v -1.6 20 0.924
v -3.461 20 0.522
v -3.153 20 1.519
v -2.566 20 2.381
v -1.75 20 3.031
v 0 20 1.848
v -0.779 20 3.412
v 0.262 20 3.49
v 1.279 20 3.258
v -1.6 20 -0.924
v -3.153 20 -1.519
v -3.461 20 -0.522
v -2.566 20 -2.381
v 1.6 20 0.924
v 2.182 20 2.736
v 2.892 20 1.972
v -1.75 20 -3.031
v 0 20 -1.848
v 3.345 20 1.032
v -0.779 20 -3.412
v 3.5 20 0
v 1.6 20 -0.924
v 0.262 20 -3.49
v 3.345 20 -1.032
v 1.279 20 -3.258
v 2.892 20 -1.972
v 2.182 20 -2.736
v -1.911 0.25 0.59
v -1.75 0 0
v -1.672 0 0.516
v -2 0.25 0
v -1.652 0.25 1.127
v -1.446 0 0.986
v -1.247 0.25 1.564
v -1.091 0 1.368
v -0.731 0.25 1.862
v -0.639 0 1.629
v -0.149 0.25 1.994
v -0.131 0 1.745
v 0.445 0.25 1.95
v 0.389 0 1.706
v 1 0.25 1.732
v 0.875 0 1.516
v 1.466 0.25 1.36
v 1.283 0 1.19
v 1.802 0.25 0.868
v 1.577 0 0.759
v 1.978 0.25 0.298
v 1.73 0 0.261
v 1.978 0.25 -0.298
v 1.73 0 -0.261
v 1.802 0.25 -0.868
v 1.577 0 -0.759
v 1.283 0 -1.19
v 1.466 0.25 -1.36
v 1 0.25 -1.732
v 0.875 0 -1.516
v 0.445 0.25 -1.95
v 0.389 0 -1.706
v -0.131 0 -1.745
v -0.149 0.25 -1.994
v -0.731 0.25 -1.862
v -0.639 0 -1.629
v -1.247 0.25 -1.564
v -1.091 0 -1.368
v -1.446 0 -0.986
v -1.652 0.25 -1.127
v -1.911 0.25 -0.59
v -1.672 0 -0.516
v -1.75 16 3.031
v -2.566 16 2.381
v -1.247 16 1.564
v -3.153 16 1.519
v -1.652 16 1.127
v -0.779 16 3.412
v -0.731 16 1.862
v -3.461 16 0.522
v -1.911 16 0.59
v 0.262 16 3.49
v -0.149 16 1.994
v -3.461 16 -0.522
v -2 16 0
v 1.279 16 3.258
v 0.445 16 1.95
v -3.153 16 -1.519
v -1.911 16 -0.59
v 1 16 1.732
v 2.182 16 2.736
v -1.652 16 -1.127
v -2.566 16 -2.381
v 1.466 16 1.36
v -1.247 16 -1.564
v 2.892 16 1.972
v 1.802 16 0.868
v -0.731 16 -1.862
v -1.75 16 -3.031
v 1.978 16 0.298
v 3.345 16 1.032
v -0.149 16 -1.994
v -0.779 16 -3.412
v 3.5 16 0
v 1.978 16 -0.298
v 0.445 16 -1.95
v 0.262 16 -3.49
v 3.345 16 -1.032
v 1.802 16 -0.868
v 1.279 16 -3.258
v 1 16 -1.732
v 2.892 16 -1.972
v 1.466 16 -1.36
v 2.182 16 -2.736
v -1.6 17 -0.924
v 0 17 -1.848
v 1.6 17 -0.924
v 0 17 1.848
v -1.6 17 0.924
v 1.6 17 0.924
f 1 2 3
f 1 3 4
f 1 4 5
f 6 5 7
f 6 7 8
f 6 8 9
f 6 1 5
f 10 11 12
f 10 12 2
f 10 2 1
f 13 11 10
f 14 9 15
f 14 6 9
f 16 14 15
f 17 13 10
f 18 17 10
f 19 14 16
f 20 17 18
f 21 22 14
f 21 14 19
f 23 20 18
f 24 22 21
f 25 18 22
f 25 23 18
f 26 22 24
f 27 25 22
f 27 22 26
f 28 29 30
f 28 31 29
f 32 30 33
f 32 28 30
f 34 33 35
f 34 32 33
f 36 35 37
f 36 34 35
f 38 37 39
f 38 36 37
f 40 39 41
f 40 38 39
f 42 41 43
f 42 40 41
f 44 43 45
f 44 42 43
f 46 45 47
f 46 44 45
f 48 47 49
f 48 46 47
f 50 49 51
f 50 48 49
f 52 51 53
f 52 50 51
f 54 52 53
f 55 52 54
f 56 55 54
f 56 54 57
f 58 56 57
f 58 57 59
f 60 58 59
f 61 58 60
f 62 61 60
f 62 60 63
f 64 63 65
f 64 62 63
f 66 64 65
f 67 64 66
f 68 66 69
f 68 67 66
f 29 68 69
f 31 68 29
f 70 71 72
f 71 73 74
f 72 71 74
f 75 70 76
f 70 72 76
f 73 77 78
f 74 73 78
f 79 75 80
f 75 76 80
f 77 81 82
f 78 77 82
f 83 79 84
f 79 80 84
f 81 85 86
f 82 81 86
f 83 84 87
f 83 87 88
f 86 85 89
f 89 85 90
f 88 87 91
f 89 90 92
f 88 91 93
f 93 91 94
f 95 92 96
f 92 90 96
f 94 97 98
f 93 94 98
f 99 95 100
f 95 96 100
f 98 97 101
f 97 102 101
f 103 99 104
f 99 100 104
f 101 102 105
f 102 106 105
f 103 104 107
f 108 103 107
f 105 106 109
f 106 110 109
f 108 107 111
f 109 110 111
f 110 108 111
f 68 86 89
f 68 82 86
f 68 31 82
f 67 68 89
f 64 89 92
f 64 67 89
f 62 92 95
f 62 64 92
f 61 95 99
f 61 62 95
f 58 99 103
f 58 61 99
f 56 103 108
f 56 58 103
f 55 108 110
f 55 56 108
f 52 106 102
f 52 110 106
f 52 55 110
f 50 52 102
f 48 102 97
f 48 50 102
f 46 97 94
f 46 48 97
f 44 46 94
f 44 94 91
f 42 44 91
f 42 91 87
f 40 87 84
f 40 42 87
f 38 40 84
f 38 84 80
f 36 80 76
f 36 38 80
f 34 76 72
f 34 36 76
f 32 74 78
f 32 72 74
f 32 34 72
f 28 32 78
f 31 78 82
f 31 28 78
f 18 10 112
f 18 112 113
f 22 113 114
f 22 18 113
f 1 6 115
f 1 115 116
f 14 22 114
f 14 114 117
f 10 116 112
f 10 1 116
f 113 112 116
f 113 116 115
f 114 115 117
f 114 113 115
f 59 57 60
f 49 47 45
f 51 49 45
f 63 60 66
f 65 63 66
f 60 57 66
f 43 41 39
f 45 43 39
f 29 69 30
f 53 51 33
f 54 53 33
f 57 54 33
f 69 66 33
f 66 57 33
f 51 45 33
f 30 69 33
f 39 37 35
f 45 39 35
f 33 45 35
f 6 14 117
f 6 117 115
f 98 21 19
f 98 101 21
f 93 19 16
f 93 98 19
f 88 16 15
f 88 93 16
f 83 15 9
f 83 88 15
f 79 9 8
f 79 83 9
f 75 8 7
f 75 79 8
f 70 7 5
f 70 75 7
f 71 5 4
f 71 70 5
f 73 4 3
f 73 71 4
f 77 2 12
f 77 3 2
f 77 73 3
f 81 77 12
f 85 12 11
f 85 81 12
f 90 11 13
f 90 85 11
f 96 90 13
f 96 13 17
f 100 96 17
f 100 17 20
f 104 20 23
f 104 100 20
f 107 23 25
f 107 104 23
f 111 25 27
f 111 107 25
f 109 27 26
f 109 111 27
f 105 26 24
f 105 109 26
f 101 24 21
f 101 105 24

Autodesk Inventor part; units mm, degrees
ref_plane "YZ Plane" through (0, 0, 0) normal (1, 0, 0) x (0, 1, 0)
ref_plane "XZ Plane" through (0, 0, 0) normal (0, 1, 0) x (-1, 0, 0)
ref_plane "XY Plane" through (0, 0, 0) normal (0, 0, 1) x (1, 0, 0)
sketch "Sketch1" plane through (0, 0, 0) normal (0, 1, 0) x (-1, 0, 0)
  circle A0 centre (0, 0) radius 2
  dimension "d0" = 4
extrude "Extrusion1" add sketch "Sketch1" along normal blind 16
sketch "Sketch2" plane through (0, 16, 0) normal (0, 1, 0) x (1, 0, 0)
  circle A0 centre (0, 0) radius 2 projected
  circle A1 centre (0, 0) radius 3.5
  dimension "d3" = 7
extrude "Extrusion2" add sketch "Sketch2" along normal blind 4 contours A0 | A1
sketch "Sketch3" plane through (0, 20, 0) normal (0, 1, 0) x (1, 0, 0)
  circle A0 centre (0, 0) radius 3.5 projected
  line L0 (0, 1.8475) -> (1.6, 0.9238)
  line L1 (1.6, 0.9238) -> (1.6, -0.9238)
  line L2 (1.6, -0.9238) -> (0, -1.8475)
  line L3 (0, -1.8475) -> (-1.6, -0.9238)
  line L4 (-1.6, -0.9238) -> (-1.6, 0.9238)
  line L5 (-1.6, 0.9238) -> (0, 1.8475)
  dimension "d6" = 1.6
extrude "Extrusion3" cut sketch "Sketch3" against normal blind 3 contours L0 L1 L2 L3 L4 L5
thread "Thread1" size "M4x0.7" class "6g" standard "ANSI Metric M Profile" full length
chamfer "Chamfer1" distance 0.25 angle 45 1 edges at (2, 0, 0)
properties part number "M4x14SHCS"
